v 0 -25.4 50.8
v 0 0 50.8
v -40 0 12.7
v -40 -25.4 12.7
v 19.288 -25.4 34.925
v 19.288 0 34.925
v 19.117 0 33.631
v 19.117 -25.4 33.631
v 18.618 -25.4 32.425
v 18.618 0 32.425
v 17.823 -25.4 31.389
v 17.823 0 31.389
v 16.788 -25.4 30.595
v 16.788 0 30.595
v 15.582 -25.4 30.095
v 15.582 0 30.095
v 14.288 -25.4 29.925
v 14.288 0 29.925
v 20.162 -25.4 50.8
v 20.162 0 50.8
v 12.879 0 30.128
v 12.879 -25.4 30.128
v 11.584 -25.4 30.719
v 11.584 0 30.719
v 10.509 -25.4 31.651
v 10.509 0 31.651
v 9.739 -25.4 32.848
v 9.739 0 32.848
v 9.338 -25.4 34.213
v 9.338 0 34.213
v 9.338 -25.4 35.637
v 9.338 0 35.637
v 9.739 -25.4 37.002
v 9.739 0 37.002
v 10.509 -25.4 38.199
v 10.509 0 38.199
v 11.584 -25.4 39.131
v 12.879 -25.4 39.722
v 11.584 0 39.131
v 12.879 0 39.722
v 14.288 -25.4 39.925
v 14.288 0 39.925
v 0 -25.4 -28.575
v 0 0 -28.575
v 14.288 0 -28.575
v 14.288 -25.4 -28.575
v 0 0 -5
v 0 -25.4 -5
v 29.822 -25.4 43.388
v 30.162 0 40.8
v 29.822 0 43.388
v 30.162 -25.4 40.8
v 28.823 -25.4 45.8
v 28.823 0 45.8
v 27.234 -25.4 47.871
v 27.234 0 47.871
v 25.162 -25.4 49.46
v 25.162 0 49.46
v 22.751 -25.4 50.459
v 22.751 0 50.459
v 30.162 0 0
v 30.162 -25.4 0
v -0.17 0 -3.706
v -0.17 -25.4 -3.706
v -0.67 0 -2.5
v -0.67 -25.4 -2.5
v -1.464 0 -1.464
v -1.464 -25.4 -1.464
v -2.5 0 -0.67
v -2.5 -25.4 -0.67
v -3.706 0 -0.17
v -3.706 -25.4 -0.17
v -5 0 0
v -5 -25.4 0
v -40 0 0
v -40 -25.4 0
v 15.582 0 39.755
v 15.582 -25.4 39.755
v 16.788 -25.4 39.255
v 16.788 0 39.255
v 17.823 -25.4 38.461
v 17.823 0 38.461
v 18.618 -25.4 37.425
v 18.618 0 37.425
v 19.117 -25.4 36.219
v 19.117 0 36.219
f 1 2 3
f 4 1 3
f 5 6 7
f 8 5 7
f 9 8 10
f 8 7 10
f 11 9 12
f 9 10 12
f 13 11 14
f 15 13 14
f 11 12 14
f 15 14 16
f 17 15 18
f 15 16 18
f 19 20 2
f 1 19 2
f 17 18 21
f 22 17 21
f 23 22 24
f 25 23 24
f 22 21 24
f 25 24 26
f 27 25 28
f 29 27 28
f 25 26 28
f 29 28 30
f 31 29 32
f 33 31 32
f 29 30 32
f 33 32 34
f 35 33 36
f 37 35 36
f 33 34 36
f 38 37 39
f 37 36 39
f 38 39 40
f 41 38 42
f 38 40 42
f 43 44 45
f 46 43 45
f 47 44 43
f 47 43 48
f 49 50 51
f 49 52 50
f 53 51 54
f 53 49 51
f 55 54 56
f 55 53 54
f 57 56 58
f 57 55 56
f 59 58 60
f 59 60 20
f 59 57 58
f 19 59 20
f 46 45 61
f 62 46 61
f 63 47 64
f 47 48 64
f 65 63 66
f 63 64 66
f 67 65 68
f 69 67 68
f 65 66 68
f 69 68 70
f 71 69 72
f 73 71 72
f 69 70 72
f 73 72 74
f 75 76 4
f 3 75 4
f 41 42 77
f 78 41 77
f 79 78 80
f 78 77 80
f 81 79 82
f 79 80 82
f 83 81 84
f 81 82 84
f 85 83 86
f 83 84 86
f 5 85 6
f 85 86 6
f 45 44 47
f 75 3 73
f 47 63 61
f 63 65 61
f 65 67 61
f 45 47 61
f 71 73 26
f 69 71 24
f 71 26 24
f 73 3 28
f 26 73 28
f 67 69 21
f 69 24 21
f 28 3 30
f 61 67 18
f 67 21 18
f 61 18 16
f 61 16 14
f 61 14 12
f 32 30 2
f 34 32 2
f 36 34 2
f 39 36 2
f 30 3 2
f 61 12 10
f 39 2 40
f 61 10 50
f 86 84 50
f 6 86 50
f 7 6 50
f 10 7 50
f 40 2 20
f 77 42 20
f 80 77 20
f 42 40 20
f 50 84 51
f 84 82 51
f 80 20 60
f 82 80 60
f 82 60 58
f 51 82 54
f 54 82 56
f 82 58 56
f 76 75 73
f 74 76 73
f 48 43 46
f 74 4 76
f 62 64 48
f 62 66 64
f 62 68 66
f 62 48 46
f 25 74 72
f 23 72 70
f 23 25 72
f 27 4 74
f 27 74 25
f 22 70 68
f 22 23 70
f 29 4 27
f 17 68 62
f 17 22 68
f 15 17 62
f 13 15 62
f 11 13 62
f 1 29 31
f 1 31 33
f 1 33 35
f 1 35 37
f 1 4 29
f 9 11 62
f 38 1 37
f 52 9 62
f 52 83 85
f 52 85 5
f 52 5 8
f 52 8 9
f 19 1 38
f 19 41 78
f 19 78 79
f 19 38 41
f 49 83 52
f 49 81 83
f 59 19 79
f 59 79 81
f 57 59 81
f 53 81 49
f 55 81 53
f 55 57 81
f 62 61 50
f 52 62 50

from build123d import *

# Parameters (mm, degrees)
F0_W     = 40
F0_H     = 12.7
F0_W_2   = 14.2875
F0_H_2   = 28.575
F1_DEPTH = 25.4
F2_R     = 10
F3_R     = 5


with BuildPart() as f1:
    # F0 (on Front) → F1 (new body)
    with BuildSketch(Plane.XZ):
        with BuildLine():
            Line((14.2875, 29.925), (14.2875, 0))
            Line((14.2875, 0), (30.1625, 0))
            Line((30.1625, 0), (30.1625, 50.8))
            Line((30.1625, 50.8), (14.2875, 50.8))
            Line((14.2875, 50.8), (14.2875, 39.925))
            ThreePointArc((14.2875, 39.925), (17.823034, 38.460534), (19.2875, 34.925))
            ThreePointArc((19.2875, 34.925), (17.823034, 31.389466), (14.2875, 29.925))
        make_face()
        with BuildLine():
            Line((0, 12.7), (0, 0))
            Line((0, 0), (14.2875, 0))
            Line((14.2875, 0), (14.2875, 29.925))
            ThreePointArc((14.2875, 29.925), (9.2875, 34.925), (14.2875, 39.925))
            Line((14.2875, 39.925), (14.2875, 50.8))
            Line((14.2875, 50.8), (0, 50.8))
            Line((0, 50.8), (0, 12.7))
        make_face()
        Polygon((-40, 12.7), (0, 12.7), (0, 50.8), align=None)
        with Locations((-20, 6.35)):
            Rectangle(F0_W, F0_H)
        with Locations((7.14375, -14.2875)):
            Rectangle(F0_W_2, F0_H_2)
        Polygon((30.1625, 0), (14.2875, 0), (14.2875, -28.575), align=None)
    extrude(amount=F1_DEPTH)

    # F2
    f2_edges = [f1.edges().sort_by_distance(p)[0] for p in [
        (30.1625, -12.7, 50.8),
    ]]
    fillet(f2_edges, radius=F2_R)

    # F3
    f3_edges = [f1.edges().sort_by_distance(p)[0] for p in [
        (0, -12.7, 0),
    ]]
    fillet(f3_edges, radius=F3_R)


solid = f1.part
